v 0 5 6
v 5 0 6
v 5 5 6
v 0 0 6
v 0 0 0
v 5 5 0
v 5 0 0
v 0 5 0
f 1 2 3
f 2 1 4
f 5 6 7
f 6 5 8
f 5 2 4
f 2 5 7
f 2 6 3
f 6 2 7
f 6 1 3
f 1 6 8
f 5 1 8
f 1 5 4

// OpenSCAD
// file: _params.scad
// =========================================================================
// 공유 파라미터 (모든 개별 부품 파일에서 include)
// 메인 어셈블리: cup_z_x_catrage_frame_water_mic_anti_3030.scad 에서 추출
// 프레임: 600 × 420 × 700mm (3030 프로파일, Y=0 대칭)
// =========================================================================

$fn = 60;  // 부품 출력용 고해상도
GLOBAL_TOLERANCE = 0.2;

// --- [1] 하부 기성품 및 원통 파라미터 ---
X_RAIL_LEN = 290.0;
X_BLOCK_W = 30.0; X_BLOCK_L = 32.0;   // 신규 X슬라이더 블록 (폭 30mm × 길이 32mm)
X_PITCH_X = 20.0; X_PITCH_Y = 20.0;   // 체결 홀 피치 (20 × 20mm, M3 나사탭 4개)
X_RAIL_W = 30.0;  X_RAIL_H = 20.0;   // 레일 폭 30mm (레일 바닥~블록 윗면 높이 29mm 반영)
X_TOTAL_H = 29.0;                    // 레일 바닥에서 슬라이더 블록 윗면까지의 높이

MOTOR_W = 42.0;      MOTOR_PITCH = 31.0; MOTOR_HOLE_D = 3.5;    
MOTOR_BOSS_D = 22.0; MOTOR_BOSS_H = 2.0; SCREW_D = 8.0;         
MOT_BODY_L = 41.0;   SHAFT_L = 24.0;     // 실측 NEMA17 몸통 41mm / 축 돌출 24mm

CUP_ID = 99.5;  CUP_WALL = 5.0; CUP_OD = 110.0;     // 아크릴 원통 OD110/ID100
CUP_H = 180.0;   CAGE_H = 60.0;  FLOOR_H = 10.0; PISTON_H = 20.0;     

LIP_D = 30.0;    LIP_H = 5.0;    LEAK_DRAIN_D = 4.0;    
GUIDE_PIPE_D = 8.0; BUSHING_OD = 12.0; BUSHING_H = 8.0;       
DRAIN_RADIUS = 35.0; DRAIN_D = 8.0;        

Y_OFFSET = 85.0; BRKT_H = 12.0; BRKT_D = 122.0; BRKT_ID = 62.0; Z_MOUNT_PCD = 86.0;   

// --- [2] 아크릴 파이프 및 상부 카트리지 ---
ACRYL_ID = 100.0; ACRYL_T = 5.0; ACRYL_OD = ACRYL_ID + (ACRYL_T * 2);  // OD110 (아크릴집 106 재고없음 → 컵과 동일 규격)

REVOLVER_PCD = 240.0;     // 인접 카트리지 웹 9.8mm 확보 (OD110 대응, 230→240)
CARTRIDGE_OD = REVOLVER_PCD + ACRYL_OD + 8; 
TOP_PLATE_H = 15.0;       // 아크릴 15T 통판 (보스홀 단 깊이 10mm)

HUB_D = 60.0;            
SHAFT_D = 12.0;          
HUB_WALL = 4.0;          
HUB_H = 15.0;             // 아크릴 5T × 3장 적층 — 파이프 130mm 대응
POCKET_DEPTH = 5.0;
MID_HUB_Z = 63.5;          // 중단 허브 하면 Z (벨트 중심 Z=71.0mm 정렬, 풀리 상단 Z=75.0mm = 축상단-1mm)
UPPER_HUB_Z = 135.0;       // 상단 허브 하면 Z (전체 135+15=150 유지)
BOSS_OD = 35.0;
BOSS_H = 11.0;             // 보스11 + 와셔1 = 12, 리세스10 → 허브 2mm 공중

// --- [3] GT2 벨트 구동 시스템 ---
GT2_PITCH     = 2.0;
GT2_BELT_W    = 6.0;
BIG_PULLEY_TEETH = 566;
BIG_PULLEY_PD = BIG_PULLEY_TEETH * GT2_PITCH / PI;
BIG_PULLEY_OD = BIG_PULLEY_PD + 1.0;
SMALL_PULLEY_TEETH = 20;
SMALL_PULLEY_PD = SMALL_PULLEY_TEETH * GT2_PITCH / PI;
SMALL_PULLEY_OD = SMALL_PULLEY_PD + 1.0;

BELT_MOTOR_X = -300;
BELT_MOTOR_Y = -155.5;
BRKT_MOTOR_H = 25.0;
BRKT_MOTOR_W = 45.0;        // 브래킷 폭 45mm (프로파일 간섭 회피 복원)
SLOT_LEN = 10.0;
FLAG_W = 15.0;  FLAG_H = 8.0;  FLAG_T = 1.5;

X_POS_MEASURE = 170.0;   // 측정 브래킷 X좌표 (X_M~X_R 정중앙, X대칭)

// --- [4] 3030 프레임 경계 (600×430×700mm) ---
PF = 30;             // 3030 알루미늄 프로파일
WASHER_T = 1.0;     

X_L = -320;
X_M = 60;
X_R = 250;
Y_F = -210;          // 전방 (대칭: -210+30=-180, Y=0 중심)
Y_B = 180;           // 후방 (대칭: 180+30=210, Y=0 중심) — 메인파일과 동기화

Z_BOT = -480;
Z_RAIL = -322;
Z_MID = -TOP_PLATE_H - PF;
Z_TOP = 220;

SUPPORT_PILLAR_H = Z_TOP - PF;

SHAFT_SQ = 20;       // 2020 사각 회전축

// 사각 축 홀 크기
SQ = SHAFT_SQ + GLOBAL_TOLERANCE;  // 20.2mm

// --- 리볼버/컵 축 정렬 (보스홀=판 중심에 리볼버 정렬) ---
REVOLVER_CX = (X_L + X_M + PF)/2;        // 판 중심 = 보스홀 = 리볼버 회전축 (-115)
DROP_X      = REVOLVER_CX + REVOLVER_PCD/2;  // 링 드롭 / 컵 적재 축 (+5)

FLANGE_Z = 52.0;       // 모터 전면 안착 높이 (Z=52mm -> 축 상단 Z=76mm, 풀리 결합)

// --- [5] 모터 체결홀 (이미 제작 완료된 15T 상판 원본 도면 수치 100% 유지) ---
MOTOR_BOLT_PITCH     = 25.0;      // Y피치 (Y = ±12.5mm)
MOTOR_BOLT_X_NOMINAL = X_L + 55;  // 1열: 상판 좌단 55 (모터축 기준 +35mm = X=-265mm)
MOTOR_BOLT_X_SHIFT   = X_L + 40;  // 2열: 상판 좌단 40 (모터축 기준 +20mm = X=-280mm)

// 모터 마운트 볼트 카운터보어 (단볼트용 — 브래킷 두께 25 중 깊게 파냄)
MOTOR_CB_D     = 6.5;            // M3 캡볼트 머리 클리어런스
MOTOR_CB_DEPTH = 19;             // 카운터보어 깊이 (잔여 통과 6mm → M3×10 단볼트)
// main file
// =========================================================================
// [부품] 포토 인터럽터 플래그 (Photo Interrupter Flag)
// 가공: 3D 프린팅 (PLA) × 1개 (매우 작음 - 허브 일체 가공 고려)
// 원점: 플래그 하면 = Z=0, 중심 = XY 원점
// 참고: 실제 조립 시 하단 허브 외주에 접착
// =========================================================================
include <_params.scad>

cube([5, 5, 6]);
